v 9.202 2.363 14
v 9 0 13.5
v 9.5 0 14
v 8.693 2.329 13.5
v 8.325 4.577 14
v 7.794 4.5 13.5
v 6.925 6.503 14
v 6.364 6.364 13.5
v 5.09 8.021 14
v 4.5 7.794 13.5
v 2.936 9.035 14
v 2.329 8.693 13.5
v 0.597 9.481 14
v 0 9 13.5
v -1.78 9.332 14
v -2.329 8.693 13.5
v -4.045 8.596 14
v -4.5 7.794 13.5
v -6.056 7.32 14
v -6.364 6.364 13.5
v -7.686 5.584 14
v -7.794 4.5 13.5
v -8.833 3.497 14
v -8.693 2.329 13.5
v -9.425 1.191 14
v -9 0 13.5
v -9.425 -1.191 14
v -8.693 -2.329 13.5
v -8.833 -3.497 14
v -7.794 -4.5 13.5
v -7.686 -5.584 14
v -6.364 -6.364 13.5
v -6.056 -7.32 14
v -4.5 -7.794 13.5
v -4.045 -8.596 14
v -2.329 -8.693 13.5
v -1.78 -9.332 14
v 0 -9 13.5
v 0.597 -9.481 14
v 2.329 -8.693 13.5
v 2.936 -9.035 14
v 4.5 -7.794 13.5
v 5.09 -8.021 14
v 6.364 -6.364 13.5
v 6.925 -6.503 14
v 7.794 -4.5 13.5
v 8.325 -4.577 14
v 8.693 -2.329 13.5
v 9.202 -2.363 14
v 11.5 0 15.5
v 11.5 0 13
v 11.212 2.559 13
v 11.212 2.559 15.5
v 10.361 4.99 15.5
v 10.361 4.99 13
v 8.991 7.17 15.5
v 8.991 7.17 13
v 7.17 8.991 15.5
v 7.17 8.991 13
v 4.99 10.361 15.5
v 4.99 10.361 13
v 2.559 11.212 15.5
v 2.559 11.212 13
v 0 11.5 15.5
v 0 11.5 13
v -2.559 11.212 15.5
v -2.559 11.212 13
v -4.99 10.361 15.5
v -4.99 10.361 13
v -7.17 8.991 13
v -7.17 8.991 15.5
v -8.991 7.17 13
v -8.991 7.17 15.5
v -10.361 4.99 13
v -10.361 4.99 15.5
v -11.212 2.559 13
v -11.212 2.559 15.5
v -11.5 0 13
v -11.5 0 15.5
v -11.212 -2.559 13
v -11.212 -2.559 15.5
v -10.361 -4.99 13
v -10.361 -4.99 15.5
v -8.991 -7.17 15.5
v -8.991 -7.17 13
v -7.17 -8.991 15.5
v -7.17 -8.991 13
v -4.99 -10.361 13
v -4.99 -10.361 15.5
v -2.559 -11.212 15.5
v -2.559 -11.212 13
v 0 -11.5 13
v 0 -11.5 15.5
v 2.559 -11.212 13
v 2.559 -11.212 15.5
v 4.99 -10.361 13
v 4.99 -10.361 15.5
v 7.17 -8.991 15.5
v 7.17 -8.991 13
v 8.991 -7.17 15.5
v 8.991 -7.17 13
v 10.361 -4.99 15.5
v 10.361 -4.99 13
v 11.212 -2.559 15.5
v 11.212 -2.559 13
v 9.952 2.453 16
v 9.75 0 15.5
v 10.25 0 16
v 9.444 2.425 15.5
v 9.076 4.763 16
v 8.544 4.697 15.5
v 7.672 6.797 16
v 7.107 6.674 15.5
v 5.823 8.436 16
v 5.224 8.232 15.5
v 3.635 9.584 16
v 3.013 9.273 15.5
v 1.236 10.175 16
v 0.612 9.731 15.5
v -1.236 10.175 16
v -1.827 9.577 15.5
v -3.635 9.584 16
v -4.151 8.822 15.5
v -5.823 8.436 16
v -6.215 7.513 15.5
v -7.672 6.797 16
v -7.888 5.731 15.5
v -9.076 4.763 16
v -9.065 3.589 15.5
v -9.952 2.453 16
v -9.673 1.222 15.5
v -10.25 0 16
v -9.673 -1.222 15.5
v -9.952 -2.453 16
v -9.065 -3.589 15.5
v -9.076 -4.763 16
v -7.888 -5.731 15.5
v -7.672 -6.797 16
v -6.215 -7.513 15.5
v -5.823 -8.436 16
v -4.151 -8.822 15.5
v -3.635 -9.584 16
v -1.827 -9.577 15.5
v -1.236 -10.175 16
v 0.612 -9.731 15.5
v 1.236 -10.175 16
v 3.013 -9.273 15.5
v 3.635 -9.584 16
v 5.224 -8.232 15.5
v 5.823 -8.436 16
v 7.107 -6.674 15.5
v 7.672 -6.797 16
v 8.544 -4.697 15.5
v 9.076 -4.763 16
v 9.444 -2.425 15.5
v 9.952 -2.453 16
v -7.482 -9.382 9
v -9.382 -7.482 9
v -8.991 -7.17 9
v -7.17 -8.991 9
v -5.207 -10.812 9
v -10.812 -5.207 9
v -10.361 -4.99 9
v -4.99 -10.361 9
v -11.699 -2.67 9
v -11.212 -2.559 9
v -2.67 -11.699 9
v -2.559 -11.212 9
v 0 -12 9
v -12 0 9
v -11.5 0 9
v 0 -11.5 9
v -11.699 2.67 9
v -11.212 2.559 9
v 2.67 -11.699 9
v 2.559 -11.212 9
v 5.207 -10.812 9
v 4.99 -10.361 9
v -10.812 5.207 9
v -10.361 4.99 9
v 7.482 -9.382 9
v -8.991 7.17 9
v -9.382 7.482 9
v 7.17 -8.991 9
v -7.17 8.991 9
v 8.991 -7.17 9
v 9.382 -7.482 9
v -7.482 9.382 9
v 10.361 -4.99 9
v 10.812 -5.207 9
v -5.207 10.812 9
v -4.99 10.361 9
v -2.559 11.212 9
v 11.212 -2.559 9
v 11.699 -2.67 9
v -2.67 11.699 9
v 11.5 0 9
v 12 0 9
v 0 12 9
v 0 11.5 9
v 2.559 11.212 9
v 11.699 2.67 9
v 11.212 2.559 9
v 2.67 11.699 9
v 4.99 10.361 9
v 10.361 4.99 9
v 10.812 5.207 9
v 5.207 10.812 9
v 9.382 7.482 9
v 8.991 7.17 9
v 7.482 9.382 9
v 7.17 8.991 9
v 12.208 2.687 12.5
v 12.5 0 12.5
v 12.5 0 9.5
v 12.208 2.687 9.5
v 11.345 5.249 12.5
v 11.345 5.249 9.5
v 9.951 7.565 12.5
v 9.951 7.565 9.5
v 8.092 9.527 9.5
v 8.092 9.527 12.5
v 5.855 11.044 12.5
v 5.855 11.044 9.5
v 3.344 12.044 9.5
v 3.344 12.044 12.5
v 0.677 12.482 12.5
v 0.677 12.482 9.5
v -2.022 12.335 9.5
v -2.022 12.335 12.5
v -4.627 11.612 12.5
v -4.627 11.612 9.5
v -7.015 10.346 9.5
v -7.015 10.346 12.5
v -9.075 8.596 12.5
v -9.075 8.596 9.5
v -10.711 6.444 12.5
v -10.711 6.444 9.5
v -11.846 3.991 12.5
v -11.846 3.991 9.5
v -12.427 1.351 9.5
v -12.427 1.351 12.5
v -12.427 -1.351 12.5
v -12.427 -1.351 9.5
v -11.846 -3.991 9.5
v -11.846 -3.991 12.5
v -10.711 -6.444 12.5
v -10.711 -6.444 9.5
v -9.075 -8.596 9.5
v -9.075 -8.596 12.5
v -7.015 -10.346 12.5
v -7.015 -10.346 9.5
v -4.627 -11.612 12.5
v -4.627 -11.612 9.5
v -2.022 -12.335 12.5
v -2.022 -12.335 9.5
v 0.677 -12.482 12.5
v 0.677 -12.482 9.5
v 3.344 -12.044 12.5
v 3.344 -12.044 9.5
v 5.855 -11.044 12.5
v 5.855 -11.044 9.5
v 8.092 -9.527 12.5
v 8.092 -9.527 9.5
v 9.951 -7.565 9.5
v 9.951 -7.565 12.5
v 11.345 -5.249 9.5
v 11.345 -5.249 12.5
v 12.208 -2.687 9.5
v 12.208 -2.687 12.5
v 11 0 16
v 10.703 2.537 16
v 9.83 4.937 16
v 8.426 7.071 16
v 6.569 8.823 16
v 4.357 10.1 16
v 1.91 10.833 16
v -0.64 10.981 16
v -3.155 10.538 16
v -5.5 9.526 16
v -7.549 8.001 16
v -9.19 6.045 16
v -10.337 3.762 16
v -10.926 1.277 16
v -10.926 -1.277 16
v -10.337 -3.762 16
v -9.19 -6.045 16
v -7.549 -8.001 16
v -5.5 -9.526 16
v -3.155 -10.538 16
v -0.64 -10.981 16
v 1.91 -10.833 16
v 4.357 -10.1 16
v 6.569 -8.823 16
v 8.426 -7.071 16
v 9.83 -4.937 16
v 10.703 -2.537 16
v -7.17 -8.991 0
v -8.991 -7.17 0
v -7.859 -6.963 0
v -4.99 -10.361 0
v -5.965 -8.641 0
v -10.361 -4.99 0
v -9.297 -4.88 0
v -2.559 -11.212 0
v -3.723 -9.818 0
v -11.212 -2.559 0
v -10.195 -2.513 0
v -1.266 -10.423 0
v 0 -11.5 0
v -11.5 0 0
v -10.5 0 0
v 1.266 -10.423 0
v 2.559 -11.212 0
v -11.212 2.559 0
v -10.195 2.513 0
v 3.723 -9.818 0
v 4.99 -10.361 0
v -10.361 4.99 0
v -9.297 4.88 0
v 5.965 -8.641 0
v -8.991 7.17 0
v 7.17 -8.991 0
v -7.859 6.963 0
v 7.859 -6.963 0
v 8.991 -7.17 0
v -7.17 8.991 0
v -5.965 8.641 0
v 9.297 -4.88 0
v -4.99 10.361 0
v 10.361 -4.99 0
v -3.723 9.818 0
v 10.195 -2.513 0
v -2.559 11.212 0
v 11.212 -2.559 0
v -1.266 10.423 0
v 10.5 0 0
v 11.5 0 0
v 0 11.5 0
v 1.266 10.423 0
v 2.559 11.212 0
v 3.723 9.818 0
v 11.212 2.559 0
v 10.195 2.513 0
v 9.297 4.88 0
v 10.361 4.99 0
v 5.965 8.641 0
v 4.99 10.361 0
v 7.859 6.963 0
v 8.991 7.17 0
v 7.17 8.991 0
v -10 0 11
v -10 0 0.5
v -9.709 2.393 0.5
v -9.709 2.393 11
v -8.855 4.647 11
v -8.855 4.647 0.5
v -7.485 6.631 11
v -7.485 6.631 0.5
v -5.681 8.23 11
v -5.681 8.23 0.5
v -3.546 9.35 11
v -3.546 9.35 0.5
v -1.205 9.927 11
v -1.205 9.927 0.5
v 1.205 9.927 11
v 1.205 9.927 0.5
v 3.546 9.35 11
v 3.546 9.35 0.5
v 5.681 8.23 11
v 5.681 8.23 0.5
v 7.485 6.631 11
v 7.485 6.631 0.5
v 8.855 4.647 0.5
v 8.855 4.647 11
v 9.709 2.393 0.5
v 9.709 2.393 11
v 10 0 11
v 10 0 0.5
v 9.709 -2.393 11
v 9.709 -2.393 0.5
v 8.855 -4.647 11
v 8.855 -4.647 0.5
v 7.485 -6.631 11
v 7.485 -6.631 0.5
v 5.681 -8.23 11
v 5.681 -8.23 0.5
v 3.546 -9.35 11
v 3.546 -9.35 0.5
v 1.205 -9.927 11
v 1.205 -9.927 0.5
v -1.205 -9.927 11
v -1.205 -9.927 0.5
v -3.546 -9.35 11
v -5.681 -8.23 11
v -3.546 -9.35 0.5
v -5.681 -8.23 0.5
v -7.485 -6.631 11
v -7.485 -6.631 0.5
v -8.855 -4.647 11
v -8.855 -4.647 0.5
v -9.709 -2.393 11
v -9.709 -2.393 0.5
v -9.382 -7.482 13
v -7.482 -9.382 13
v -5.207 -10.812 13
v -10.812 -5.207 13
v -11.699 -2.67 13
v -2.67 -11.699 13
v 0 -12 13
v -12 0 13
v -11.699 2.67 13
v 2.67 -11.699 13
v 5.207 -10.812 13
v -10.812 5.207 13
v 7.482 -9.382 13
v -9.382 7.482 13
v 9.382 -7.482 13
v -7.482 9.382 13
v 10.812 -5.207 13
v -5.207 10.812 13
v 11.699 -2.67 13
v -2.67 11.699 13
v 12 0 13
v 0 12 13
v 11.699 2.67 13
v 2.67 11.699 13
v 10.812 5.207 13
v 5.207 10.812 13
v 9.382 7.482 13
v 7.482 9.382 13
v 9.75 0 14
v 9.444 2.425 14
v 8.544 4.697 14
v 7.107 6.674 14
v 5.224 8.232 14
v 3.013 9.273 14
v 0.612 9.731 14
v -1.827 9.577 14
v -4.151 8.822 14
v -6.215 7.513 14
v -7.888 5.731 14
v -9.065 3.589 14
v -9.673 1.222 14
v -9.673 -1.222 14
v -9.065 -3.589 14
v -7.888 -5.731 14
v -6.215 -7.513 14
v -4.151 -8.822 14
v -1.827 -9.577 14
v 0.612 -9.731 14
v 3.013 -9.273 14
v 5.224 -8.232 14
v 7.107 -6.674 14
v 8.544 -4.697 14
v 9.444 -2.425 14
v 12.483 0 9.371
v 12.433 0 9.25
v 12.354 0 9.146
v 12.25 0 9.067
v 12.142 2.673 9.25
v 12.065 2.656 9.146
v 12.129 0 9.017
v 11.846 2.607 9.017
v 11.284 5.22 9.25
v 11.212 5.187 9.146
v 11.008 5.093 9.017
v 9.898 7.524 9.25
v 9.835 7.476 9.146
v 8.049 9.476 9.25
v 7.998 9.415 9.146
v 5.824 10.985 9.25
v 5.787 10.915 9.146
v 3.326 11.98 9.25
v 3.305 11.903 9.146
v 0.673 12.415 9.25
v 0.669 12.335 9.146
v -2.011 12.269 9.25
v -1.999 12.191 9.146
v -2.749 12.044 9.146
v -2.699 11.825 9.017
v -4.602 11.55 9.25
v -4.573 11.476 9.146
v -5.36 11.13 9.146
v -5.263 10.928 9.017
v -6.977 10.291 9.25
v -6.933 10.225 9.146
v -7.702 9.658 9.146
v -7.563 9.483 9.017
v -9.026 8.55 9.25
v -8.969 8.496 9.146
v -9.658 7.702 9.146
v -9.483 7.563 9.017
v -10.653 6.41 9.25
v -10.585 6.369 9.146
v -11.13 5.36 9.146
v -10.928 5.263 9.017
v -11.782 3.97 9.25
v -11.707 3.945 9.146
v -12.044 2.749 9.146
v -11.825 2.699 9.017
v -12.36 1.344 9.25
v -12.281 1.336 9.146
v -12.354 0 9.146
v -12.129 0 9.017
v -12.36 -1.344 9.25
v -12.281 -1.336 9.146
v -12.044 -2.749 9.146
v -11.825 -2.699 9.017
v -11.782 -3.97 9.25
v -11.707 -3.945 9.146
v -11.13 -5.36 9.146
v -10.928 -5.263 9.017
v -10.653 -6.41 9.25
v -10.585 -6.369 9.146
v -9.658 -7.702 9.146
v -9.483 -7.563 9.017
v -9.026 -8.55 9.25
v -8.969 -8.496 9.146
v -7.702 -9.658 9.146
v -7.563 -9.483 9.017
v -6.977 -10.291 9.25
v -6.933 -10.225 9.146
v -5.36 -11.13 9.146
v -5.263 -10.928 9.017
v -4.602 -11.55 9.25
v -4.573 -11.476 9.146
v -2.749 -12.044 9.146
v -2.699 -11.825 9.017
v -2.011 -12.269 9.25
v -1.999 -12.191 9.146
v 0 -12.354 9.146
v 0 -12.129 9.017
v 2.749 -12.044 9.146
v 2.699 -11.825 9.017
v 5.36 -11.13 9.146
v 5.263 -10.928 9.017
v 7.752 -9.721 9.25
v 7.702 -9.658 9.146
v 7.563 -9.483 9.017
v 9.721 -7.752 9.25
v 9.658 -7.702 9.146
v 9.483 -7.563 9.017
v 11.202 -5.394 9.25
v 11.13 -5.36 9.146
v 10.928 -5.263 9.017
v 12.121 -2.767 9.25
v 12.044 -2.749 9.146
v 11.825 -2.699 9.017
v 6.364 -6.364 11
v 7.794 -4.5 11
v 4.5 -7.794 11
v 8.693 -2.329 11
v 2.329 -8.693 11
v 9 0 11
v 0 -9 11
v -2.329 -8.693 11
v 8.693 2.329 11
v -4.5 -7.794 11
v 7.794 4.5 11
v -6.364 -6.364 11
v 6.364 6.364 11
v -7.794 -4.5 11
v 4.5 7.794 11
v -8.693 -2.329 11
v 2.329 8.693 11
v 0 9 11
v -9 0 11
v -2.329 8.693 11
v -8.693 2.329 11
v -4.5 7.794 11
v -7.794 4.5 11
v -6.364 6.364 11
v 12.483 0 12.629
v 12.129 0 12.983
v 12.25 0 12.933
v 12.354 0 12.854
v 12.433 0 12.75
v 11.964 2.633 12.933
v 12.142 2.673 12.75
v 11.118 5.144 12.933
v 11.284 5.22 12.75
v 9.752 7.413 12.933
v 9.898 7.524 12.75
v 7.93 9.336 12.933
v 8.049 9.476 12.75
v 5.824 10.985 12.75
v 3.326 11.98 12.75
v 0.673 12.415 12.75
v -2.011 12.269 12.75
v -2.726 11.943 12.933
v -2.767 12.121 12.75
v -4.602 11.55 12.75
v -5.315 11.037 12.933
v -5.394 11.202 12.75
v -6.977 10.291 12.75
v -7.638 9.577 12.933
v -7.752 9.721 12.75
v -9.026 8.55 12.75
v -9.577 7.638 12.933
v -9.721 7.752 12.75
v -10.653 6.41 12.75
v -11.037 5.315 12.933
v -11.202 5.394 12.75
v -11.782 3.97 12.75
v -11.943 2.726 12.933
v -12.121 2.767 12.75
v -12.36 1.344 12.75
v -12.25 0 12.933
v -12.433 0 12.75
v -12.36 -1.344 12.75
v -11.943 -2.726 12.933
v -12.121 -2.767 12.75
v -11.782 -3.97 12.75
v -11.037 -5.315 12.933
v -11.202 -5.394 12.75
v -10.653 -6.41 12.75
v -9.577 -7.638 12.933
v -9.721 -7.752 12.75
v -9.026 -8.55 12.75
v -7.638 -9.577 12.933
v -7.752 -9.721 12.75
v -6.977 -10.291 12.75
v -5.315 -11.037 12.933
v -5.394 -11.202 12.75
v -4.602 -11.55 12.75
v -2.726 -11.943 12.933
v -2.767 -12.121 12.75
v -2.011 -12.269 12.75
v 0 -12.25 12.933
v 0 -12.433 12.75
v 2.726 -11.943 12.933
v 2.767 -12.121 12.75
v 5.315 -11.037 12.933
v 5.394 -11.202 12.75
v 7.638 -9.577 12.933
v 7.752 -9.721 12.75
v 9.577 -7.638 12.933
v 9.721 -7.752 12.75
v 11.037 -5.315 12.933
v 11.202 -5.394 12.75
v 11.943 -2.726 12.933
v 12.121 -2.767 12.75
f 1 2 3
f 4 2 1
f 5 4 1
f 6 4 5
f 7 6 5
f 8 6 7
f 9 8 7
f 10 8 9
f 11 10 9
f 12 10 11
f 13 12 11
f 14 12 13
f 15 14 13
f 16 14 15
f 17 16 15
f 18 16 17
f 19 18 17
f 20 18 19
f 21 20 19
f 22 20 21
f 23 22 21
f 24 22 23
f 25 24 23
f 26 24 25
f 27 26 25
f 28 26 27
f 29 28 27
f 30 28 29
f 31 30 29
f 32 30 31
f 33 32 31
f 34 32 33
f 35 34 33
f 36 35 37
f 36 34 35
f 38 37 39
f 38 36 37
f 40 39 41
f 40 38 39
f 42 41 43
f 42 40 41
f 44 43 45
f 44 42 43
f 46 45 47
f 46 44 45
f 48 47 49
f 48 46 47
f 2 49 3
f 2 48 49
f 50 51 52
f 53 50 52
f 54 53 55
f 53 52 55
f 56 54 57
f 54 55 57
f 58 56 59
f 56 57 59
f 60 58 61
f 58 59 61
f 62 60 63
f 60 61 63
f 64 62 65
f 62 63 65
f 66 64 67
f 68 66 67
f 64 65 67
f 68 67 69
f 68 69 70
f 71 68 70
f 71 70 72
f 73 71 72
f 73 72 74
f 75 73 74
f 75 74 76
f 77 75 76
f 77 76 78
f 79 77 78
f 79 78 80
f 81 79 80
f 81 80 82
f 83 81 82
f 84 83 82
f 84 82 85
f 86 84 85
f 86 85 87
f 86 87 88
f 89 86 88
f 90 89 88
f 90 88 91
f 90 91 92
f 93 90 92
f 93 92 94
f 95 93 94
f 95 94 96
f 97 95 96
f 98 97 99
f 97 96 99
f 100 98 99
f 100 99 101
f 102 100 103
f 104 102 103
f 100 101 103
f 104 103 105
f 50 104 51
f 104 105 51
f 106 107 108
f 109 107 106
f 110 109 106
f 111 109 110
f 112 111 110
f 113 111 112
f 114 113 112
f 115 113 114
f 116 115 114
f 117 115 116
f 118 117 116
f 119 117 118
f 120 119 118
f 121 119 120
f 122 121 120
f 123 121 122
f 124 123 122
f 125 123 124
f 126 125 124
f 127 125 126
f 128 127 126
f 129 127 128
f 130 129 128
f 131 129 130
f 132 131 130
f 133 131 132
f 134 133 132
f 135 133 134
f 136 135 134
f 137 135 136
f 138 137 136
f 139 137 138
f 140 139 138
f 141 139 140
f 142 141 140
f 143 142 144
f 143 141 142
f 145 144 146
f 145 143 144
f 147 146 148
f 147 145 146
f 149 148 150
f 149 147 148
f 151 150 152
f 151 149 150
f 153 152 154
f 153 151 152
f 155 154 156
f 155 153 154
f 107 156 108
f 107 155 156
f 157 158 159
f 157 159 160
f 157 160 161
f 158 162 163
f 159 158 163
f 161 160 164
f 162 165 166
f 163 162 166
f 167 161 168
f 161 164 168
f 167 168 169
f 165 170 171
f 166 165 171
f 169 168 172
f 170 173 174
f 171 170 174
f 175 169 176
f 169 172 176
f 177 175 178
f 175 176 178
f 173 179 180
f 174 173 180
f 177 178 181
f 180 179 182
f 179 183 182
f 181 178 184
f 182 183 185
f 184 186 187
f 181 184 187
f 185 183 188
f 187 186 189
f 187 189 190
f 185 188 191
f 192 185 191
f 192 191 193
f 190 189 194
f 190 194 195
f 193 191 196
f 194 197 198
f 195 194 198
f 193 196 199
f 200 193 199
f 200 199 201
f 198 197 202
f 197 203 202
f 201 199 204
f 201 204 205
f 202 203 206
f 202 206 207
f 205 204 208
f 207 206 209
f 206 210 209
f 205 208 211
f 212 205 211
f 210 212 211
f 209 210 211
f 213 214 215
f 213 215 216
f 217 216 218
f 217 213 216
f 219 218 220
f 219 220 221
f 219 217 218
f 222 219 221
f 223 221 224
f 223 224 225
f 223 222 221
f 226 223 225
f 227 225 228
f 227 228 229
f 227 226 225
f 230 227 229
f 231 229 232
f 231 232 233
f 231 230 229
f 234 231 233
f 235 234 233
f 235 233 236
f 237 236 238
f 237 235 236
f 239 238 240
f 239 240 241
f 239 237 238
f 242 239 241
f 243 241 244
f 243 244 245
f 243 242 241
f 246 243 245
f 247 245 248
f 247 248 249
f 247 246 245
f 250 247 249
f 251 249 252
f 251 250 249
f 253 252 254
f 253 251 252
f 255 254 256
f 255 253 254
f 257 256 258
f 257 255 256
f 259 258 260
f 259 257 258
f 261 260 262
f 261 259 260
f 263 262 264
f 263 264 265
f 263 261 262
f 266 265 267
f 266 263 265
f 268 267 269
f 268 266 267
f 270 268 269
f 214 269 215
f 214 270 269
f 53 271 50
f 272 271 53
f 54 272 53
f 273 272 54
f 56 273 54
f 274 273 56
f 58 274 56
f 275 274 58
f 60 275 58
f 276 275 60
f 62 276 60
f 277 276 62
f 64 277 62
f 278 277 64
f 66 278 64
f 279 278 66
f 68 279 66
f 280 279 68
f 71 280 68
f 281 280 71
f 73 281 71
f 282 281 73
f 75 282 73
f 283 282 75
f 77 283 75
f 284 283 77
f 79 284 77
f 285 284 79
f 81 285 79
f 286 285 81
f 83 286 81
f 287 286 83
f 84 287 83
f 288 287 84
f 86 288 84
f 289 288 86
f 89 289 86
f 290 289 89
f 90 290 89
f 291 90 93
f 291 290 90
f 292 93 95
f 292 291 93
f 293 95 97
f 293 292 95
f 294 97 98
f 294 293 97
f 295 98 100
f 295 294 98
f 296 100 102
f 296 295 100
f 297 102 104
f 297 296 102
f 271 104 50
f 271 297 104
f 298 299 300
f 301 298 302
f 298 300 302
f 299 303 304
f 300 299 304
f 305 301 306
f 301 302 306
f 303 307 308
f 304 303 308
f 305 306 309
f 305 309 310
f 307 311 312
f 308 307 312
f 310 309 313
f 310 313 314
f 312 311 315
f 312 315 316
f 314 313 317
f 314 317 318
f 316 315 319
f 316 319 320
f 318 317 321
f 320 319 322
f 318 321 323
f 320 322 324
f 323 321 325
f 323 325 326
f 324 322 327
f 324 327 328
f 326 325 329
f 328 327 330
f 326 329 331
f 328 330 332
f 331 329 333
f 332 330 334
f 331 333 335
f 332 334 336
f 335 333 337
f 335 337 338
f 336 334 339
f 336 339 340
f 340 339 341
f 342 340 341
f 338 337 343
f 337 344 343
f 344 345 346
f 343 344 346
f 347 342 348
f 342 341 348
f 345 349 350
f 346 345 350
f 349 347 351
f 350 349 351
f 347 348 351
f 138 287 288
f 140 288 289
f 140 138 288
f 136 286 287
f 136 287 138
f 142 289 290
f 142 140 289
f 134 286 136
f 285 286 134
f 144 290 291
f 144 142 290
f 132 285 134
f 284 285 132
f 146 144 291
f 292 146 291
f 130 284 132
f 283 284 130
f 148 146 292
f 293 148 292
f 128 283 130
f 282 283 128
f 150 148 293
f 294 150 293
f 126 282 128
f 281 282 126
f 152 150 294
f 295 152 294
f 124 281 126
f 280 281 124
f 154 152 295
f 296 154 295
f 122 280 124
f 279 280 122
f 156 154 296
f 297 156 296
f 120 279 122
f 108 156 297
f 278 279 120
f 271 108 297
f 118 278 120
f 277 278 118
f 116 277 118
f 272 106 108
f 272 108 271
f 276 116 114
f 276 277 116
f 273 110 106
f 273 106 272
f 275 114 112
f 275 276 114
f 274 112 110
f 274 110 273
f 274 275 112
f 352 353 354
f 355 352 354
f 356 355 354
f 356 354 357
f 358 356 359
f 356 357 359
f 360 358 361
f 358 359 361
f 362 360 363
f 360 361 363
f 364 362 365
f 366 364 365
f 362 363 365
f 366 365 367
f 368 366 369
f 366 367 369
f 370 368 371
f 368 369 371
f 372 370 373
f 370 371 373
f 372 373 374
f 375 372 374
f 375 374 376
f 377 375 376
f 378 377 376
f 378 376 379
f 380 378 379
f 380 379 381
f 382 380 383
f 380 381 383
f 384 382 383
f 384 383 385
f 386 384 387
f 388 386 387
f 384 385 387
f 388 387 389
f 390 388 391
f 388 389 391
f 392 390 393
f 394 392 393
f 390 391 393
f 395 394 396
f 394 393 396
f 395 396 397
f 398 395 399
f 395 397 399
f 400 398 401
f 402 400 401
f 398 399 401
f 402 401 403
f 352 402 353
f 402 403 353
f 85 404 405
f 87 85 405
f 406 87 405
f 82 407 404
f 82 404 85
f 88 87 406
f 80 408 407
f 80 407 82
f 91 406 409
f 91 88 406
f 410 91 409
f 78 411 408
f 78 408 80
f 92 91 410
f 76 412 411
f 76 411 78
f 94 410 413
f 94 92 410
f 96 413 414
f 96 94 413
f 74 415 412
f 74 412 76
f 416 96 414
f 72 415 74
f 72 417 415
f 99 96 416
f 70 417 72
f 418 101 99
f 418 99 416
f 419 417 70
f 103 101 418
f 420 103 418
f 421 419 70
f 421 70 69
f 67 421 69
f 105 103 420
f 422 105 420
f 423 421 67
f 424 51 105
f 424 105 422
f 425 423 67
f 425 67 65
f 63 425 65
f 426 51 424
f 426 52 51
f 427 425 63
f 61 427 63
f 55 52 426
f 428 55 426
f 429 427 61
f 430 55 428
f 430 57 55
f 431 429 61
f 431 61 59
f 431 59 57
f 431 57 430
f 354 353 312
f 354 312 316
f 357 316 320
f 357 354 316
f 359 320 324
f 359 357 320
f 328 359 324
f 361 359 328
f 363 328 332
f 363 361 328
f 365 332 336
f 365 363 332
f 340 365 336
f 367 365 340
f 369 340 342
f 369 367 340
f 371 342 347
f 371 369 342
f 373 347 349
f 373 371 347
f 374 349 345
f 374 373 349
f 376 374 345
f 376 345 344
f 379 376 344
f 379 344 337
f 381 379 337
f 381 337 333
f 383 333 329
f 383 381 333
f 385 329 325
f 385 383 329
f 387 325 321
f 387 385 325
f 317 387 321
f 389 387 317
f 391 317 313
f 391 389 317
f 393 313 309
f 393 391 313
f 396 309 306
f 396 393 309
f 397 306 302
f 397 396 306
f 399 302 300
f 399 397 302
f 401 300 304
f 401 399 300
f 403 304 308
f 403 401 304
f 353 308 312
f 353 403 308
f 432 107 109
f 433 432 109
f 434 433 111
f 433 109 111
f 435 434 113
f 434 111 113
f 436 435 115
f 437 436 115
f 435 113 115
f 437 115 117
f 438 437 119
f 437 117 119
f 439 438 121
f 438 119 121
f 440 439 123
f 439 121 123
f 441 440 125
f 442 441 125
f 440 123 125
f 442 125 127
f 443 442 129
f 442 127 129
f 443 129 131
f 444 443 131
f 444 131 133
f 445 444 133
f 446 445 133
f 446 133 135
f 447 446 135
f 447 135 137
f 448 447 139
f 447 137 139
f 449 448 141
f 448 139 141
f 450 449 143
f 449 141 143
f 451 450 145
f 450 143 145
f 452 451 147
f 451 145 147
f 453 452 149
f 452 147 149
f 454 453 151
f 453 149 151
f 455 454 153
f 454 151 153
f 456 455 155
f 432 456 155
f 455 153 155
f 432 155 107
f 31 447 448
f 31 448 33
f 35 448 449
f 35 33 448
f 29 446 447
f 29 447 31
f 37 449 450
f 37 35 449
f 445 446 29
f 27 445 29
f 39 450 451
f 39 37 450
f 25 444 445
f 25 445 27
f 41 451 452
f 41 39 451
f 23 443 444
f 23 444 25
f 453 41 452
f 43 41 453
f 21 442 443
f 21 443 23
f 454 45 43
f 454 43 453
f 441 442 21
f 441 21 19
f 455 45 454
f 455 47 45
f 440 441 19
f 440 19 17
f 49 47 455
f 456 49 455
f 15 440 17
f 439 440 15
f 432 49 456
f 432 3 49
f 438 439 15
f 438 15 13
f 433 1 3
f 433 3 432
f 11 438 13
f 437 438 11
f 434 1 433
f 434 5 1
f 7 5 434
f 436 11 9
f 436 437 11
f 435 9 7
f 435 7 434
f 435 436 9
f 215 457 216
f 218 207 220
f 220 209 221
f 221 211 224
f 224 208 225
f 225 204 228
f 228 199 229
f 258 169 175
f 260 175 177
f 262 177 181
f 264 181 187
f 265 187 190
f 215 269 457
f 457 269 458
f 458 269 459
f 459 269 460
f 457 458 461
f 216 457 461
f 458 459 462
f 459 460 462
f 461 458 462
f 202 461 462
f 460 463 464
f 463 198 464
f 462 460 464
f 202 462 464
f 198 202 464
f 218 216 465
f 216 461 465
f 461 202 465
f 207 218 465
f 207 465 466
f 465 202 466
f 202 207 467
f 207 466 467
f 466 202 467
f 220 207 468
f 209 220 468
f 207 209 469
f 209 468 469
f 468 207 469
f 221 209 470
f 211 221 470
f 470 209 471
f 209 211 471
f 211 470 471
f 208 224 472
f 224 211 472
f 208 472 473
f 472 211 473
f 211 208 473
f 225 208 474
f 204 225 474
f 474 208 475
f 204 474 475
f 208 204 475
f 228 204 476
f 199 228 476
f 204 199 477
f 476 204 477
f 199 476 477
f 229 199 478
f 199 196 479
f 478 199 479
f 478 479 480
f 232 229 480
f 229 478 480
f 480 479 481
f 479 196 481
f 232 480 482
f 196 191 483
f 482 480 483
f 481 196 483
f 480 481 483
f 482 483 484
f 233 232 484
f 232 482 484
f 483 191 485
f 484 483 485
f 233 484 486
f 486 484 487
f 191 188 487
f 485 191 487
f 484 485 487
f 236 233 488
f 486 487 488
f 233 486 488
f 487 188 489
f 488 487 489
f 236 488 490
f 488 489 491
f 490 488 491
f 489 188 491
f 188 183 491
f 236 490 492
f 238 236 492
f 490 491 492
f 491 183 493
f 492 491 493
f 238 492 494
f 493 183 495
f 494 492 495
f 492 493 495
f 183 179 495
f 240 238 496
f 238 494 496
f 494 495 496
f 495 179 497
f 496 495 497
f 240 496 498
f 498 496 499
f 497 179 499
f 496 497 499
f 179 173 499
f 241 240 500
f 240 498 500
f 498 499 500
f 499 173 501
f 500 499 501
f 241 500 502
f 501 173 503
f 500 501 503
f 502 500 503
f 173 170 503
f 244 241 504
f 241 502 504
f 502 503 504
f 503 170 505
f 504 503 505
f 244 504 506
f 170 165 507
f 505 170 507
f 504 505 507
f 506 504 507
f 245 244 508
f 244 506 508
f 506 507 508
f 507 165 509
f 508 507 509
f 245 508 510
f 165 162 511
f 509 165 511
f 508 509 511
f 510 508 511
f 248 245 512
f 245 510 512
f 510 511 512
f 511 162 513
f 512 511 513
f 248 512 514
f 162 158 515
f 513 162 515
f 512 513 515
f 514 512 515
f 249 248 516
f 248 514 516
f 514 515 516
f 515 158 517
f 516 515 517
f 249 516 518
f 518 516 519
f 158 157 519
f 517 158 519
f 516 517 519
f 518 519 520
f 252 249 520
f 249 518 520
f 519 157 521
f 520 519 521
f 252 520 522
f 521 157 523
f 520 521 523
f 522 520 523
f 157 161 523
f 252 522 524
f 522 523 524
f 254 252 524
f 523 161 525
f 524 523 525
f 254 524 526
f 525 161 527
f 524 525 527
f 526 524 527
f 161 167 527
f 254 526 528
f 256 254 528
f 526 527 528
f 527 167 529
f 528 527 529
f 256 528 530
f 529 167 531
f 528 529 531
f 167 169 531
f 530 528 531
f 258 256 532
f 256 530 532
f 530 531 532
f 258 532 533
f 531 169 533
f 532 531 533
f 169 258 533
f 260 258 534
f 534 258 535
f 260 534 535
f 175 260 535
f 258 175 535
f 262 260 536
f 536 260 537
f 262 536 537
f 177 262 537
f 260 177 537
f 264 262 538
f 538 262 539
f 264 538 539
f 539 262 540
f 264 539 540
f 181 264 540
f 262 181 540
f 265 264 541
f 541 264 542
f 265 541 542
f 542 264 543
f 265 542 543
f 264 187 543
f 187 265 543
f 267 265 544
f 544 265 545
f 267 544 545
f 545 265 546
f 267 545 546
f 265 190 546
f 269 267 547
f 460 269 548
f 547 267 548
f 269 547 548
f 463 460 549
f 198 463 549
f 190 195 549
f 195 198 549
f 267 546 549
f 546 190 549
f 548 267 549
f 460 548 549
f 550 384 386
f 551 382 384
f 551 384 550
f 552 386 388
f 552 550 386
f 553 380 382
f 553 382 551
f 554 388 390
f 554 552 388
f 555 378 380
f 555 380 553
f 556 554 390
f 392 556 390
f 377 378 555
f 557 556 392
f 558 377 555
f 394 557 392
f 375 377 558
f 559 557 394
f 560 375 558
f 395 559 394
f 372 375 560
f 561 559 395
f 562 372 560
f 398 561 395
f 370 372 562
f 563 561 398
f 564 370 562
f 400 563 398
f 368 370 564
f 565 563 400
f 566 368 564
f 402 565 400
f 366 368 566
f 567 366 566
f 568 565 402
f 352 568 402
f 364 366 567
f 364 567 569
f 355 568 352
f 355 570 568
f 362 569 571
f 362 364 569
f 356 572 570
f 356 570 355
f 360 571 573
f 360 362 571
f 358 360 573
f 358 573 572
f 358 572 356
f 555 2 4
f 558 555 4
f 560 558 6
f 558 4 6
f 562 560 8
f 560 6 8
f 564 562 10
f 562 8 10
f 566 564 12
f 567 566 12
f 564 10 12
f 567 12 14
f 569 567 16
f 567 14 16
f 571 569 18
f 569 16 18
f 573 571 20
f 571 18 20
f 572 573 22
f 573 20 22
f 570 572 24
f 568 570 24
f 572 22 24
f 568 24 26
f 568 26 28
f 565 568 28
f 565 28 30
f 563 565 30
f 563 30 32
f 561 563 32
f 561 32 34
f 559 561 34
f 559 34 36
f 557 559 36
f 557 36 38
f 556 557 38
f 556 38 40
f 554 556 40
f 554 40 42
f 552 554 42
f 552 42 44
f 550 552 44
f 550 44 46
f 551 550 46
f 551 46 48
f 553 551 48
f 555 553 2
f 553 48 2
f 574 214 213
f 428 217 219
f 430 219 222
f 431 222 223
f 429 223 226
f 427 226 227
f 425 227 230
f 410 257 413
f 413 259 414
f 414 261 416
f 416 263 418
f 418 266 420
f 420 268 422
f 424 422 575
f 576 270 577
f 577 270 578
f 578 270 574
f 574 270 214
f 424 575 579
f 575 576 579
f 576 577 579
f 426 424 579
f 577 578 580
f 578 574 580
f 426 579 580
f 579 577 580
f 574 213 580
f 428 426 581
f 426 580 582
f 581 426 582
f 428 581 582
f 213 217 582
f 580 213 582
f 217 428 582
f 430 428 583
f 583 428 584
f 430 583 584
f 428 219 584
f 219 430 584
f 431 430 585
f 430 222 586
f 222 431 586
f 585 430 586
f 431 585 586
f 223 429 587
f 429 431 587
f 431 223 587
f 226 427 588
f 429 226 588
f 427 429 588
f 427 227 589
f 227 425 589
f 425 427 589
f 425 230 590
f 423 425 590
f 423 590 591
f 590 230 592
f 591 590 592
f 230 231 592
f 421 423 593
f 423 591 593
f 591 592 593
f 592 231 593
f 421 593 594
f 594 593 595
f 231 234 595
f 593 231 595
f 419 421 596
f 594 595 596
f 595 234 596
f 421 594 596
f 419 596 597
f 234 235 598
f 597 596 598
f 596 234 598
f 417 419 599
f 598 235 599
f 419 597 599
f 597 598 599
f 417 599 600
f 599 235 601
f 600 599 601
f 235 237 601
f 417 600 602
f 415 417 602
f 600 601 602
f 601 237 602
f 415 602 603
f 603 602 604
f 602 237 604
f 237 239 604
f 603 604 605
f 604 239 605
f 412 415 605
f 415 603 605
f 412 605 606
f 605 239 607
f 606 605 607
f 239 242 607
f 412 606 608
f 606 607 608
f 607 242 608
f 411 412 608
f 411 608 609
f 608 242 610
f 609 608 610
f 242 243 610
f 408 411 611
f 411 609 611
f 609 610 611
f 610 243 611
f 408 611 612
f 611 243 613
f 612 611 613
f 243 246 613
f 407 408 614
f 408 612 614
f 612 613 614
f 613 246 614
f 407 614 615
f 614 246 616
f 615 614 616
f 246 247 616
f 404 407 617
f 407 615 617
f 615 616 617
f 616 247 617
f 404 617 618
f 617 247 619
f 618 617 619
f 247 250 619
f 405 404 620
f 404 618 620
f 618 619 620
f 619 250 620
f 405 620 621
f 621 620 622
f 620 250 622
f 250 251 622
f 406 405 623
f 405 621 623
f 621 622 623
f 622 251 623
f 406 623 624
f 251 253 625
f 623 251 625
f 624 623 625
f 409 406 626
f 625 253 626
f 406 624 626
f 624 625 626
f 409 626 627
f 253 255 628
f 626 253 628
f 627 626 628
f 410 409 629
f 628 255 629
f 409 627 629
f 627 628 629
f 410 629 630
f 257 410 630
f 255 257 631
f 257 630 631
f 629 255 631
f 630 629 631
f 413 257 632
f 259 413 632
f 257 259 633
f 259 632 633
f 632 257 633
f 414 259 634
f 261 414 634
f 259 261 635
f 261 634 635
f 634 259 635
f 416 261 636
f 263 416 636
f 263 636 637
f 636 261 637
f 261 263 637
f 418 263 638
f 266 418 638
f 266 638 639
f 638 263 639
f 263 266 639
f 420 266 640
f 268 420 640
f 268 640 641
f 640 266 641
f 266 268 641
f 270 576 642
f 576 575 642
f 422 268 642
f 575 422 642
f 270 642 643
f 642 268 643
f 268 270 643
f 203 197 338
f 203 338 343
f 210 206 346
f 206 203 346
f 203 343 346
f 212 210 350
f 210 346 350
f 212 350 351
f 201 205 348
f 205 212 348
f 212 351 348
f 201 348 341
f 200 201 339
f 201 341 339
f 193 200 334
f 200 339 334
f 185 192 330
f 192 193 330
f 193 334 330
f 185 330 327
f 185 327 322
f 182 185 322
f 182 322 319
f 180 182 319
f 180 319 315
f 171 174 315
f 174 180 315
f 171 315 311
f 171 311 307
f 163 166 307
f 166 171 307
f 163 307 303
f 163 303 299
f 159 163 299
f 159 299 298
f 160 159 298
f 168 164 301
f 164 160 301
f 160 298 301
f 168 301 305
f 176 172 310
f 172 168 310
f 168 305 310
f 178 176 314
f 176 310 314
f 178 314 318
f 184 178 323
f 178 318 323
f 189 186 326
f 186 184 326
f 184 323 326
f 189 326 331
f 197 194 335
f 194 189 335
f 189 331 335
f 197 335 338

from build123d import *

# Parameters (mm, degrees)
SKETCH_1_R          = 11.5
EXTRUDE_1_DEPTH     = 16
EXTRUDE_START       = -3
SKETCH_2_R          = 12.5
EXTRUDE_2_DEPTH     = 4
SKETCH_3_R          = 9.75
CUT_EXTRUDE_1_DEPTH = 2
SKETCH_4_R          = 9
CUT_EXTRUDE_2_DEPTH = 23.549944568
SKETCH_5_R          = 10
CUT_EXTRUDE_3_DEPTH = 11
CHAMFER_1_SIZE      = 0.5
FILLET_1_R          = 0.5


with BuildPart() as part:
    # 草图1 → 凸台-拉伸1 (new body)
    with BuildSketch(Plane.XY):
        Circle(SKETCH_1_R)
    extrude(amount=EXTRUDE_1_DEPTH)

    # 草图2 → 凸台-拉伸2 (add)
    with BuildSketch(Plane.XY.offset(16).offset(EXTRUDE_START)):
        Circle(SKETCH_2_R)
    extrude(amount=-EXTRUDE_2_DEPTH)

    # 草图3 → 切除-拉伸1 (cut)
    with BuildSketch(Plane.XY.offset(16)):
        Circle(SKETCH_3_R)
    extrude(amount=-CUT_EXTRUDE_1_DEPTH, mode=Mode.SUBTRACT)

    # 草图4 → 切除-拉伸2 (cut, through all)
    with BuildSketch(Plane.XY.offset(14)):
        Circle(SKETCH_4_R)
    extrude(amount=-CUT_EXTRUDE_2_DEPTH, mode=Mode.SUBTRACT)

    # 草图5 → 切除-拉伸3 (cut)
    with BuildSketch(Plane(origin=(0, 0, 0), x_dir=(-1, 0, 0), z_dir=(0, 0, -1))):
        Circle(SKETCH_5_R)
    extrude(amount=-CUT_EXTRUDE_3_DEPTH, mode=Mode.SUBTRACT)

    # 倒角1
    chamfer_1_edges = [part.edges().sort_by_distance(p)[0] for p in [
        (-9.75, 0, 16),
        (-9, 0, 14),
        (10, 0, 0),
        (-11.5, 0, 16),
    ]]
    chamfer(chamfer_1_edges, length=CHAMFER_1_SIZE)

    # 圆角1
    fillet_1_edges = [part.edges().sort_by_distance(p)[0] for p in [
        (-12.5, 0, 9),
        (-12.5, 0, 13),
    ]]
    fillet(fillet_1_edges, radius=FILLET_1_R)


solid = part.part
